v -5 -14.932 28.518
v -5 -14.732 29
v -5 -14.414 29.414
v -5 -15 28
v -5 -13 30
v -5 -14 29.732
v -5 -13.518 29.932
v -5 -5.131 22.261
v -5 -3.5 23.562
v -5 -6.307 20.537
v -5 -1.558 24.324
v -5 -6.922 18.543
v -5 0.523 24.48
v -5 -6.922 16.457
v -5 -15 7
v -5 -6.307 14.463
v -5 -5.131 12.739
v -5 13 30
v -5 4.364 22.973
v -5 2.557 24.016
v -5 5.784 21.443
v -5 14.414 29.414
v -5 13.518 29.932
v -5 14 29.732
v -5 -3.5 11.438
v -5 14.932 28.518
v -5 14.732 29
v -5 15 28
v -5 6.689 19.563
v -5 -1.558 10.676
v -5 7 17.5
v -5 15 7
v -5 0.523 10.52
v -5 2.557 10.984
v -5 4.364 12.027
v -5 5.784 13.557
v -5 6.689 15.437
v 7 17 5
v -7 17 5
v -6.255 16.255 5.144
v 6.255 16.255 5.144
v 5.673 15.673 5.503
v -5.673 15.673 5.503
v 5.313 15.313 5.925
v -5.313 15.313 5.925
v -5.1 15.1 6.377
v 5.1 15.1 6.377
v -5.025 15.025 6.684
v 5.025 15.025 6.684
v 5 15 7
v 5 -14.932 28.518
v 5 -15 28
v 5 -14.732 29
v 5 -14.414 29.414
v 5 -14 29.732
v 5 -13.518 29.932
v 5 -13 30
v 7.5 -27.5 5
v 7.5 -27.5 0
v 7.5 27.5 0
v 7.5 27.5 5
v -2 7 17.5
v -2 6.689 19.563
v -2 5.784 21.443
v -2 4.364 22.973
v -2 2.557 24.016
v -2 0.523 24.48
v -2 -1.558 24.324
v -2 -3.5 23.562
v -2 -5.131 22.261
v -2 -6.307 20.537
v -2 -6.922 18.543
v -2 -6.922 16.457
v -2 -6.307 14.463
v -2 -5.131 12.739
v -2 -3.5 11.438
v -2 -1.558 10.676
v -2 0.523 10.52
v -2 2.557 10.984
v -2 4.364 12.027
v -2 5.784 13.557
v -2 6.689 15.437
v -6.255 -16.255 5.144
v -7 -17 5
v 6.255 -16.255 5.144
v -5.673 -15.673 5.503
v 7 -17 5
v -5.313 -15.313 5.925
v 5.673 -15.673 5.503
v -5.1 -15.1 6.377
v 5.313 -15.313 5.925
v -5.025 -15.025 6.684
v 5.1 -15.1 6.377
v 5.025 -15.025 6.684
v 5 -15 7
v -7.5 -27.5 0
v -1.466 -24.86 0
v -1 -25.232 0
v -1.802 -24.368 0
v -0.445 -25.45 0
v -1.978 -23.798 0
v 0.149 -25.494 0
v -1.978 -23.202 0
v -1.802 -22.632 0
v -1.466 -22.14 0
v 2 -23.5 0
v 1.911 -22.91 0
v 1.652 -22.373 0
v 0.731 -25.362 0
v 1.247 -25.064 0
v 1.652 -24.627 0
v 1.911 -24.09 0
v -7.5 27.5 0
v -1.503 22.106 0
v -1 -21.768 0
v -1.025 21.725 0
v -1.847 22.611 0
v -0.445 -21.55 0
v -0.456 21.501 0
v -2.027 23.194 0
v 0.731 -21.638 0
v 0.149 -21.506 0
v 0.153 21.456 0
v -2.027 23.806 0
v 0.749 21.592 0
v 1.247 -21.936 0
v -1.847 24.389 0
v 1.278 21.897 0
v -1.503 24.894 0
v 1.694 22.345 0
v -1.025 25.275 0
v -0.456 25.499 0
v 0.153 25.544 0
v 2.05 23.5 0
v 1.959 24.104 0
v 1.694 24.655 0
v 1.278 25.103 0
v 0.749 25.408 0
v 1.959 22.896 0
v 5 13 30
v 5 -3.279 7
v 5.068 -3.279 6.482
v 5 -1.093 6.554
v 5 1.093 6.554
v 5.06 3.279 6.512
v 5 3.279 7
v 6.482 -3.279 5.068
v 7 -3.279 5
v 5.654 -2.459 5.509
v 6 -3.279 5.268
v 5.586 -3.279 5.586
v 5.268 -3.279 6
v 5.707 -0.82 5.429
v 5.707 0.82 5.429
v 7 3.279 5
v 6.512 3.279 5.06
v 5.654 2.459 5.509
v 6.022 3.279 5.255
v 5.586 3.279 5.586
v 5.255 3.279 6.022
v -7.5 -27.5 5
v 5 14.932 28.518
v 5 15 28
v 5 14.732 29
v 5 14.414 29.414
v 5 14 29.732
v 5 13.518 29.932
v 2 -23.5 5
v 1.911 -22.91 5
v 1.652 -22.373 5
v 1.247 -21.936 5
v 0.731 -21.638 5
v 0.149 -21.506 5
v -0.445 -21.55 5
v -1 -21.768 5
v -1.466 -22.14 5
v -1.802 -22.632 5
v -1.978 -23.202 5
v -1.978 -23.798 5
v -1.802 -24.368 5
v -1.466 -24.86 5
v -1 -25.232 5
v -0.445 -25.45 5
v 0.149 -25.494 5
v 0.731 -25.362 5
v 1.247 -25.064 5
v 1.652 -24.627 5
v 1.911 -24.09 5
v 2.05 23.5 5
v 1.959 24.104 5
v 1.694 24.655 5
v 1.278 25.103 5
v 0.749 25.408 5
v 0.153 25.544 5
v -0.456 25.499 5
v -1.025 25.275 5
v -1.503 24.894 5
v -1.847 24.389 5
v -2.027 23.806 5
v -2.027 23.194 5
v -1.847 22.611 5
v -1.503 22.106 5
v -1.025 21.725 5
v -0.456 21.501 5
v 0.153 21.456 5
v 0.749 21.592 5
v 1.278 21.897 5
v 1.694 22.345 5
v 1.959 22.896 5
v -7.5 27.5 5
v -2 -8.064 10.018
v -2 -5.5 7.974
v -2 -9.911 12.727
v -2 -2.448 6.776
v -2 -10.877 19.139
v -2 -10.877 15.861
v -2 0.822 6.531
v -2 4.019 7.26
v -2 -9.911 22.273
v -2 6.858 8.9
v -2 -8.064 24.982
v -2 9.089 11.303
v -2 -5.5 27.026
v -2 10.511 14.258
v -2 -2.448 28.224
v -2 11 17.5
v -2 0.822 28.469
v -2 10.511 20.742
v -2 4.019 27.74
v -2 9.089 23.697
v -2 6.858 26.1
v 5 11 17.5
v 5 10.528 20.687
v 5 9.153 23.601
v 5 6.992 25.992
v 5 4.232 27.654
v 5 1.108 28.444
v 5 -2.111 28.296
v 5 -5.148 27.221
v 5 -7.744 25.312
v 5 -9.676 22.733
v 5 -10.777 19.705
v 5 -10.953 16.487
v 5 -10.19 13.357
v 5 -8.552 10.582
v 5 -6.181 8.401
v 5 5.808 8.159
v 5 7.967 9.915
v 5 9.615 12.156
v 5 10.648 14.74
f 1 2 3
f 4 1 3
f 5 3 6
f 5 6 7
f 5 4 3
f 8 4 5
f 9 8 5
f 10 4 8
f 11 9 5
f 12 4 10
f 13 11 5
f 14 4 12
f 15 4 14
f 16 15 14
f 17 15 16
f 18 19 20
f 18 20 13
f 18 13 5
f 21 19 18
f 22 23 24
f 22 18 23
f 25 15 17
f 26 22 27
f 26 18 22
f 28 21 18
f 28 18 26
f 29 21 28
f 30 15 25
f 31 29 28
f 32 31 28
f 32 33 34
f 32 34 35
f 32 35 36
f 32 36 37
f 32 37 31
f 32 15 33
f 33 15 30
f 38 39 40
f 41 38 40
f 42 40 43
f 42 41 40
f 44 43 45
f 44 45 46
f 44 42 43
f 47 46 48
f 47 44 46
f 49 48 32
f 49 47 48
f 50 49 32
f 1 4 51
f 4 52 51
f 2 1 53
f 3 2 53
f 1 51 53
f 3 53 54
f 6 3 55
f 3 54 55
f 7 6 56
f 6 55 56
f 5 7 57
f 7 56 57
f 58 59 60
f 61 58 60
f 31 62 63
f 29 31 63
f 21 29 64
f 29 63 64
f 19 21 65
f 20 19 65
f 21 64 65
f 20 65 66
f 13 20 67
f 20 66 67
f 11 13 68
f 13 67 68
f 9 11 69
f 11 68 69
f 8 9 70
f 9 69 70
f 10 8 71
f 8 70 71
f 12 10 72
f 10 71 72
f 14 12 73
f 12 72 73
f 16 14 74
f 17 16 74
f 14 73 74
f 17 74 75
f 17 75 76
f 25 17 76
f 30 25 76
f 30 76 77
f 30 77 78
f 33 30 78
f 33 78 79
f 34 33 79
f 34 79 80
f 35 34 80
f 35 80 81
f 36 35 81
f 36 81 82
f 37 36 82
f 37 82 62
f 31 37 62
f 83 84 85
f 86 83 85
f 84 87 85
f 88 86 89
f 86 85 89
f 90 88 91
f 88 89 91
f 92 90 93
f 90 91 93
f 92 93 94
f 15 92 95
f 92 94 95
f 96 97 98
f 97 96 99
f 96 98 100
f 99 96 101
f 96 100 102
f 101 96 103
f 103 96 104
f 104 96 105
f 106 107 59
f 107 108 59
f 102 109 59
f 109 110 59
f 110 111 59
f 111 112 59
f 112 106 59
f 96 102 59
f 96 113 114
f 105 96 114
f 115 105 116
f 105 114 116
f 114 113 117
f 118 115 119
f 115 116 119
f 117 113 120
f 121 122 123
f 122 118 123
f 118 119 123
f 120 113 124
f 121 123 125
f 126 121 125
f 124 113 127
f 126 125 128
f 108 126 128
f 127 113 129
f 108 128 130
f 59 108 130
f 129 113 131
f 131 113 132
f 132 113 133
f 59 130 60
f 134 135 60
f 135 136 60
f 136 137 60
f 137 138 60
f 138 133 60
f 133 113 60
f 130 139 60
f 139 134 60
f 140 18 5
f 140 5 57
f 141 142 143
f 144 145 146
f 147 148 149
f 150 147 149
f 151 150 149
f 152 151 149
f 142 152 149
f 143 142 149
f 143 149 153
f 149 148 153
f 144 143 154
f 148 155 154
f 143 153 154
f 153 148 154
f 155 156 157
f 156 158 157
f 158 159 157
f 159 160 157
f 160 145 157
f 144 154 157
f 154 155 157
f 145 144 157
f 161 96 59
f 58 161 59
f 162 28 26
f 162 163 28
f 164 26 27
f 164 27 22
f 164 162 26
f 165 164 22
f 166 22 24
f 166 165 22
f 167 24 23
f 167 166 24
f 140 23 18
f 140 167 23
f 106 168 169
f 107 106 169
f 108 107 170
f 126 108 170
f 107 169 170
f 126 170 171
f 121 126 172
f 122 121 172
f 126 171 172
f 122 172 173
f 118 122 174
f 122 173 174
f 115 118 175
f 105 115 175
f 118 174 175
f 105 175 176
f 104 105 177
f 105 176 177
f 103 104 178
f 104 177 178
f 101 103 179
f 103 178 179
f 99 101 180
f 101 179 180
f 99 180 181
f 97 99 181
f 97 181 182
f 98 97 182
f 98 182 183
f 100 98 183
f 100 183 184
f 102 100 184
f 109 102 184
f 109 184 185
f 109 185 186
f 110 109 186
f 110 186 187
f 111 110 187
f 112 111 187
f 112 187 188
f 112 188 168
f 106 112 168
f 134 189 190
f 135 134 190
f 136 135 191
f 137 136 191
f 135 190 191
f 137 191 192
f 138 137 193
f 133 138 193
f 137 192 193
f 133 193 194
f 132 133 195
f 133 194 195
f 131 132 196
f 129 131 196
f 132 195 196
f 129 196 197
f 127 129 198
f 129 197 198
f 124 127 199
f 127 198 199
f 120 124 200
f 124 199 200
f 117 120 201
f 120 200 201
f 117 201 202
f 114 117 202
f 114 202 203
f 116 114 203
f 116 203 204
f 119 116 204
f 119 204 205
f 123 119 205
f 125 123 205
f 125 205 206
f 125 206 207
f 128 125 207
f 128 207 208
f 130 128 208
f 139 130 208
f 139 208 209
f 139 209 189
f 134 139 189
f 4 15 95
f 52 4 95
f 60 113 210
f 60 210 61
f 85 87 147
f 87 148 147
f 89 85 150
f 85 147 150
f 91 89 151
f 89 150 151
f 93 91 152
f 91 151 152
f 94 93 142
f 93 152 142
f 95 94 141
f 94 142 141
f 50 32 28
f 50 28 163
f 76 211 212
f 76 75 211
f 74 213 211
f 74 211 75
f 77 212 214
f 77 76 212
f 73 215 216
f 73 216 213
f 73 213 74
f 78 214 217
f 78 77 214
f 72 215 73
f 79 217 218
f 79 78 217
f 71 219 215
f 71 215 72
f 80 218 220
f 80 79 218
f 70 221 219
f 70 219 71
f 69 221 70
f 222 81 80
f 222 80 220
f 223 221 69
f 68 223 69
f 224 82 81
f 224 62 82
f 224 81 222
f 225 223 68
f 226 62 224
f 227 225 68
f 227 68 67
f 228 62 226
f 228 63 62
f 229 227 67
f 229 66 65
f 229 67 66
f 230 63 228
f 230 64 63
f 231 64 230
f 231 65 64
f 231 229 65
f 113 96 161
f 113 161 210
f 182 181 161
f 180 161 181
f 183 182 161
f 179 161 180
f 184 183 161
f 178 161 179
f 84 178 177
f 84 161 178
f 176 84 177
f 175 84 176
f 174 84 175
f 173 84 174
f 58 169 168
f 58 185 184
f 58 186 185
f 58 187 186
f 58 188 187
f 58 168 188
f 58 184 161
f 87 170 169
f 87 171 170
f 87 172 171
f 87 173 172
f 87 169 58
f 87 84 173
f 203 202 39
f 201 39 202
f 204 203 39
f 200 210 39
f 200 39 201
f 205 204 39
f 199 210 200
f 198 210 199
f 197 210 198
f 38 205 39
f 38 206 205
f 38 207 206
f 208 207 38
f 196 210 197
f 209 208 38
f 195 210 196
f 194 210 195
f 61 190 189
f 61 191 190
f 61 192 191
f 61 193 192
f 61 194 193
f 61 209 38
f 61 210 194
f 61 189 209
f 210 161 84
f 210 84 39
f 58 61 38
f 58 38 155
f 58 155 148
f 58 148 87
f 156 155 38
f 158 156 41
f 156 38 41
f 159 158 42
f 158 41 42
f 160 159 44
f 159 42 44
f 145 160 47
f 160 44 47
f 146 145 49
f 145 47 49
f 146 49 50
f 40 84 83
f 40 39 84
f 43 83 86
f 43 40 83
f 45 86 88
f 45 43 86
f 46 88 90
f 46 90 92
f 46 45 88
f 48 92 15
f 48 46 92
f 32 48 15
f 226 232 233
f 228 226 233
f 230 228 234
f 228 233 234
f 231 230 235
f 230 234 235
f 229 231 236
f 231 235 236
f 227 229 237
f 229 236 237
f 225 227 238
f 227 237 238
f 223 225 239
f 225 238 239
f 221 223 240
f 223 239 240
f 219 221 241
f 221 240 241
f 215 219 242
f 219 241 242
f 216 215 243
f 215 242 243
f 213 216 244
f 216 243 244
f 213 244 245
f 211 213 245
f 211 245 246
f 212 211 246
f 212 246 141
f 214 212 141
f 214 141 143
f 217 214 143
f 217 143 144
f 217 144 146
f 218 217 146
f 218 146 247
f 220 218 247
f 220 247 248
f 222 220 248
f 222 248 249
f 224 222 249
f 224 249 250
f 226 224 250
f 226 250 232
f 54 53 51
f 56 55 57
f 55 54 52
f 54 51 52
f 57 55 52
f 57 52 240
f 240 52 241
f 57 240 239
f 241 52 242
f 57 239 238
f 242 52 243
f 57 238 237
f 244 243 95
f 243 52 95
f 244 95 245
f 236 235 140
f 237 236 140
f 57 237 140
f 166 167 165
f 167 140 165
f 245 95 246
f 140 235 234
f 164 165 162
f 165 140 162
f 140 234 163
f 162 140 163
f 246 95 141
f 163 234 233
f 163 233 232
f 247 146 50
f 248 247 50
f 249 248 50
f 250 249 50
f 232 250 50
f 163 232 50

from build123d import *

# Parameters (mm, degrees)
F0_W      = 15
F0_H      = 55
F1_DEPTH  = 5
F2_W      = 10
F2_H      = 30
F3_DEPTH  = 25
F4_R      = 11
F5_DEPTH  = 7
F6_R      = 2
F6_R_2    = 2.05
F7_DEPTH  = 25
F8_R      = 2
F9_R      = 7
F10_DEPTH = 5.501


with BuildPart() as f1:
    # F0 (on Top) → F1 (new body)
    with BuildSketch(Plane.XY):
        Rectangle(F0_W, F0_H)
    extrude(amount=F1_DEPTH)

    # F2 (on face) → F3 (join)
    with BuildSketch(Plane.XY.offset(5)):
        Rectangle(F2_W, F2_H)
    extrude(amount=F3_DEPTH)

    # F4 (on face) → F5 (cut)
    with BuildSketch(Plane.YZ.offset(5)):
        with Locations((0, 17.5)):
            Circle(F4_R)
    extrude(amount=-F5_DEPTH, mode=Mode.SUBTRACT)

    # F6 (on face) → F7 (cut)
    with BuildSketch(Plane.XY.offset(5)):
        with Locations((0, -23.5)):
            Circle(F6_R)
        with Locations((0, 23.5)):
            Circle(F6_R_2)
    extrude(amount=-F7_DEPTH, mode=Mode.SUBTRACT)

    # F8
    f8_edges = [f1.edges().sort_by_distance(p)[0] for p in [
        (0, -15, 30),
        (0, -15, 5),
        (5, 0, 5),
        (0, 15, 30),
        (0, 15, 5),
        (-5, 0, 5),
    ]]
    fillet(f8_edges, radius=F8_R)

    # F9 (on face) → F10 (cut, through all)
    with BuildSketch(Plane.YZ.offset(-2)):
        with Locations((0, 17.5)):
            Circle(F9_R)
    extrude(amount=-F10_DEPTH, mode=Mode.SUBTRACT)


solid = f1.part
